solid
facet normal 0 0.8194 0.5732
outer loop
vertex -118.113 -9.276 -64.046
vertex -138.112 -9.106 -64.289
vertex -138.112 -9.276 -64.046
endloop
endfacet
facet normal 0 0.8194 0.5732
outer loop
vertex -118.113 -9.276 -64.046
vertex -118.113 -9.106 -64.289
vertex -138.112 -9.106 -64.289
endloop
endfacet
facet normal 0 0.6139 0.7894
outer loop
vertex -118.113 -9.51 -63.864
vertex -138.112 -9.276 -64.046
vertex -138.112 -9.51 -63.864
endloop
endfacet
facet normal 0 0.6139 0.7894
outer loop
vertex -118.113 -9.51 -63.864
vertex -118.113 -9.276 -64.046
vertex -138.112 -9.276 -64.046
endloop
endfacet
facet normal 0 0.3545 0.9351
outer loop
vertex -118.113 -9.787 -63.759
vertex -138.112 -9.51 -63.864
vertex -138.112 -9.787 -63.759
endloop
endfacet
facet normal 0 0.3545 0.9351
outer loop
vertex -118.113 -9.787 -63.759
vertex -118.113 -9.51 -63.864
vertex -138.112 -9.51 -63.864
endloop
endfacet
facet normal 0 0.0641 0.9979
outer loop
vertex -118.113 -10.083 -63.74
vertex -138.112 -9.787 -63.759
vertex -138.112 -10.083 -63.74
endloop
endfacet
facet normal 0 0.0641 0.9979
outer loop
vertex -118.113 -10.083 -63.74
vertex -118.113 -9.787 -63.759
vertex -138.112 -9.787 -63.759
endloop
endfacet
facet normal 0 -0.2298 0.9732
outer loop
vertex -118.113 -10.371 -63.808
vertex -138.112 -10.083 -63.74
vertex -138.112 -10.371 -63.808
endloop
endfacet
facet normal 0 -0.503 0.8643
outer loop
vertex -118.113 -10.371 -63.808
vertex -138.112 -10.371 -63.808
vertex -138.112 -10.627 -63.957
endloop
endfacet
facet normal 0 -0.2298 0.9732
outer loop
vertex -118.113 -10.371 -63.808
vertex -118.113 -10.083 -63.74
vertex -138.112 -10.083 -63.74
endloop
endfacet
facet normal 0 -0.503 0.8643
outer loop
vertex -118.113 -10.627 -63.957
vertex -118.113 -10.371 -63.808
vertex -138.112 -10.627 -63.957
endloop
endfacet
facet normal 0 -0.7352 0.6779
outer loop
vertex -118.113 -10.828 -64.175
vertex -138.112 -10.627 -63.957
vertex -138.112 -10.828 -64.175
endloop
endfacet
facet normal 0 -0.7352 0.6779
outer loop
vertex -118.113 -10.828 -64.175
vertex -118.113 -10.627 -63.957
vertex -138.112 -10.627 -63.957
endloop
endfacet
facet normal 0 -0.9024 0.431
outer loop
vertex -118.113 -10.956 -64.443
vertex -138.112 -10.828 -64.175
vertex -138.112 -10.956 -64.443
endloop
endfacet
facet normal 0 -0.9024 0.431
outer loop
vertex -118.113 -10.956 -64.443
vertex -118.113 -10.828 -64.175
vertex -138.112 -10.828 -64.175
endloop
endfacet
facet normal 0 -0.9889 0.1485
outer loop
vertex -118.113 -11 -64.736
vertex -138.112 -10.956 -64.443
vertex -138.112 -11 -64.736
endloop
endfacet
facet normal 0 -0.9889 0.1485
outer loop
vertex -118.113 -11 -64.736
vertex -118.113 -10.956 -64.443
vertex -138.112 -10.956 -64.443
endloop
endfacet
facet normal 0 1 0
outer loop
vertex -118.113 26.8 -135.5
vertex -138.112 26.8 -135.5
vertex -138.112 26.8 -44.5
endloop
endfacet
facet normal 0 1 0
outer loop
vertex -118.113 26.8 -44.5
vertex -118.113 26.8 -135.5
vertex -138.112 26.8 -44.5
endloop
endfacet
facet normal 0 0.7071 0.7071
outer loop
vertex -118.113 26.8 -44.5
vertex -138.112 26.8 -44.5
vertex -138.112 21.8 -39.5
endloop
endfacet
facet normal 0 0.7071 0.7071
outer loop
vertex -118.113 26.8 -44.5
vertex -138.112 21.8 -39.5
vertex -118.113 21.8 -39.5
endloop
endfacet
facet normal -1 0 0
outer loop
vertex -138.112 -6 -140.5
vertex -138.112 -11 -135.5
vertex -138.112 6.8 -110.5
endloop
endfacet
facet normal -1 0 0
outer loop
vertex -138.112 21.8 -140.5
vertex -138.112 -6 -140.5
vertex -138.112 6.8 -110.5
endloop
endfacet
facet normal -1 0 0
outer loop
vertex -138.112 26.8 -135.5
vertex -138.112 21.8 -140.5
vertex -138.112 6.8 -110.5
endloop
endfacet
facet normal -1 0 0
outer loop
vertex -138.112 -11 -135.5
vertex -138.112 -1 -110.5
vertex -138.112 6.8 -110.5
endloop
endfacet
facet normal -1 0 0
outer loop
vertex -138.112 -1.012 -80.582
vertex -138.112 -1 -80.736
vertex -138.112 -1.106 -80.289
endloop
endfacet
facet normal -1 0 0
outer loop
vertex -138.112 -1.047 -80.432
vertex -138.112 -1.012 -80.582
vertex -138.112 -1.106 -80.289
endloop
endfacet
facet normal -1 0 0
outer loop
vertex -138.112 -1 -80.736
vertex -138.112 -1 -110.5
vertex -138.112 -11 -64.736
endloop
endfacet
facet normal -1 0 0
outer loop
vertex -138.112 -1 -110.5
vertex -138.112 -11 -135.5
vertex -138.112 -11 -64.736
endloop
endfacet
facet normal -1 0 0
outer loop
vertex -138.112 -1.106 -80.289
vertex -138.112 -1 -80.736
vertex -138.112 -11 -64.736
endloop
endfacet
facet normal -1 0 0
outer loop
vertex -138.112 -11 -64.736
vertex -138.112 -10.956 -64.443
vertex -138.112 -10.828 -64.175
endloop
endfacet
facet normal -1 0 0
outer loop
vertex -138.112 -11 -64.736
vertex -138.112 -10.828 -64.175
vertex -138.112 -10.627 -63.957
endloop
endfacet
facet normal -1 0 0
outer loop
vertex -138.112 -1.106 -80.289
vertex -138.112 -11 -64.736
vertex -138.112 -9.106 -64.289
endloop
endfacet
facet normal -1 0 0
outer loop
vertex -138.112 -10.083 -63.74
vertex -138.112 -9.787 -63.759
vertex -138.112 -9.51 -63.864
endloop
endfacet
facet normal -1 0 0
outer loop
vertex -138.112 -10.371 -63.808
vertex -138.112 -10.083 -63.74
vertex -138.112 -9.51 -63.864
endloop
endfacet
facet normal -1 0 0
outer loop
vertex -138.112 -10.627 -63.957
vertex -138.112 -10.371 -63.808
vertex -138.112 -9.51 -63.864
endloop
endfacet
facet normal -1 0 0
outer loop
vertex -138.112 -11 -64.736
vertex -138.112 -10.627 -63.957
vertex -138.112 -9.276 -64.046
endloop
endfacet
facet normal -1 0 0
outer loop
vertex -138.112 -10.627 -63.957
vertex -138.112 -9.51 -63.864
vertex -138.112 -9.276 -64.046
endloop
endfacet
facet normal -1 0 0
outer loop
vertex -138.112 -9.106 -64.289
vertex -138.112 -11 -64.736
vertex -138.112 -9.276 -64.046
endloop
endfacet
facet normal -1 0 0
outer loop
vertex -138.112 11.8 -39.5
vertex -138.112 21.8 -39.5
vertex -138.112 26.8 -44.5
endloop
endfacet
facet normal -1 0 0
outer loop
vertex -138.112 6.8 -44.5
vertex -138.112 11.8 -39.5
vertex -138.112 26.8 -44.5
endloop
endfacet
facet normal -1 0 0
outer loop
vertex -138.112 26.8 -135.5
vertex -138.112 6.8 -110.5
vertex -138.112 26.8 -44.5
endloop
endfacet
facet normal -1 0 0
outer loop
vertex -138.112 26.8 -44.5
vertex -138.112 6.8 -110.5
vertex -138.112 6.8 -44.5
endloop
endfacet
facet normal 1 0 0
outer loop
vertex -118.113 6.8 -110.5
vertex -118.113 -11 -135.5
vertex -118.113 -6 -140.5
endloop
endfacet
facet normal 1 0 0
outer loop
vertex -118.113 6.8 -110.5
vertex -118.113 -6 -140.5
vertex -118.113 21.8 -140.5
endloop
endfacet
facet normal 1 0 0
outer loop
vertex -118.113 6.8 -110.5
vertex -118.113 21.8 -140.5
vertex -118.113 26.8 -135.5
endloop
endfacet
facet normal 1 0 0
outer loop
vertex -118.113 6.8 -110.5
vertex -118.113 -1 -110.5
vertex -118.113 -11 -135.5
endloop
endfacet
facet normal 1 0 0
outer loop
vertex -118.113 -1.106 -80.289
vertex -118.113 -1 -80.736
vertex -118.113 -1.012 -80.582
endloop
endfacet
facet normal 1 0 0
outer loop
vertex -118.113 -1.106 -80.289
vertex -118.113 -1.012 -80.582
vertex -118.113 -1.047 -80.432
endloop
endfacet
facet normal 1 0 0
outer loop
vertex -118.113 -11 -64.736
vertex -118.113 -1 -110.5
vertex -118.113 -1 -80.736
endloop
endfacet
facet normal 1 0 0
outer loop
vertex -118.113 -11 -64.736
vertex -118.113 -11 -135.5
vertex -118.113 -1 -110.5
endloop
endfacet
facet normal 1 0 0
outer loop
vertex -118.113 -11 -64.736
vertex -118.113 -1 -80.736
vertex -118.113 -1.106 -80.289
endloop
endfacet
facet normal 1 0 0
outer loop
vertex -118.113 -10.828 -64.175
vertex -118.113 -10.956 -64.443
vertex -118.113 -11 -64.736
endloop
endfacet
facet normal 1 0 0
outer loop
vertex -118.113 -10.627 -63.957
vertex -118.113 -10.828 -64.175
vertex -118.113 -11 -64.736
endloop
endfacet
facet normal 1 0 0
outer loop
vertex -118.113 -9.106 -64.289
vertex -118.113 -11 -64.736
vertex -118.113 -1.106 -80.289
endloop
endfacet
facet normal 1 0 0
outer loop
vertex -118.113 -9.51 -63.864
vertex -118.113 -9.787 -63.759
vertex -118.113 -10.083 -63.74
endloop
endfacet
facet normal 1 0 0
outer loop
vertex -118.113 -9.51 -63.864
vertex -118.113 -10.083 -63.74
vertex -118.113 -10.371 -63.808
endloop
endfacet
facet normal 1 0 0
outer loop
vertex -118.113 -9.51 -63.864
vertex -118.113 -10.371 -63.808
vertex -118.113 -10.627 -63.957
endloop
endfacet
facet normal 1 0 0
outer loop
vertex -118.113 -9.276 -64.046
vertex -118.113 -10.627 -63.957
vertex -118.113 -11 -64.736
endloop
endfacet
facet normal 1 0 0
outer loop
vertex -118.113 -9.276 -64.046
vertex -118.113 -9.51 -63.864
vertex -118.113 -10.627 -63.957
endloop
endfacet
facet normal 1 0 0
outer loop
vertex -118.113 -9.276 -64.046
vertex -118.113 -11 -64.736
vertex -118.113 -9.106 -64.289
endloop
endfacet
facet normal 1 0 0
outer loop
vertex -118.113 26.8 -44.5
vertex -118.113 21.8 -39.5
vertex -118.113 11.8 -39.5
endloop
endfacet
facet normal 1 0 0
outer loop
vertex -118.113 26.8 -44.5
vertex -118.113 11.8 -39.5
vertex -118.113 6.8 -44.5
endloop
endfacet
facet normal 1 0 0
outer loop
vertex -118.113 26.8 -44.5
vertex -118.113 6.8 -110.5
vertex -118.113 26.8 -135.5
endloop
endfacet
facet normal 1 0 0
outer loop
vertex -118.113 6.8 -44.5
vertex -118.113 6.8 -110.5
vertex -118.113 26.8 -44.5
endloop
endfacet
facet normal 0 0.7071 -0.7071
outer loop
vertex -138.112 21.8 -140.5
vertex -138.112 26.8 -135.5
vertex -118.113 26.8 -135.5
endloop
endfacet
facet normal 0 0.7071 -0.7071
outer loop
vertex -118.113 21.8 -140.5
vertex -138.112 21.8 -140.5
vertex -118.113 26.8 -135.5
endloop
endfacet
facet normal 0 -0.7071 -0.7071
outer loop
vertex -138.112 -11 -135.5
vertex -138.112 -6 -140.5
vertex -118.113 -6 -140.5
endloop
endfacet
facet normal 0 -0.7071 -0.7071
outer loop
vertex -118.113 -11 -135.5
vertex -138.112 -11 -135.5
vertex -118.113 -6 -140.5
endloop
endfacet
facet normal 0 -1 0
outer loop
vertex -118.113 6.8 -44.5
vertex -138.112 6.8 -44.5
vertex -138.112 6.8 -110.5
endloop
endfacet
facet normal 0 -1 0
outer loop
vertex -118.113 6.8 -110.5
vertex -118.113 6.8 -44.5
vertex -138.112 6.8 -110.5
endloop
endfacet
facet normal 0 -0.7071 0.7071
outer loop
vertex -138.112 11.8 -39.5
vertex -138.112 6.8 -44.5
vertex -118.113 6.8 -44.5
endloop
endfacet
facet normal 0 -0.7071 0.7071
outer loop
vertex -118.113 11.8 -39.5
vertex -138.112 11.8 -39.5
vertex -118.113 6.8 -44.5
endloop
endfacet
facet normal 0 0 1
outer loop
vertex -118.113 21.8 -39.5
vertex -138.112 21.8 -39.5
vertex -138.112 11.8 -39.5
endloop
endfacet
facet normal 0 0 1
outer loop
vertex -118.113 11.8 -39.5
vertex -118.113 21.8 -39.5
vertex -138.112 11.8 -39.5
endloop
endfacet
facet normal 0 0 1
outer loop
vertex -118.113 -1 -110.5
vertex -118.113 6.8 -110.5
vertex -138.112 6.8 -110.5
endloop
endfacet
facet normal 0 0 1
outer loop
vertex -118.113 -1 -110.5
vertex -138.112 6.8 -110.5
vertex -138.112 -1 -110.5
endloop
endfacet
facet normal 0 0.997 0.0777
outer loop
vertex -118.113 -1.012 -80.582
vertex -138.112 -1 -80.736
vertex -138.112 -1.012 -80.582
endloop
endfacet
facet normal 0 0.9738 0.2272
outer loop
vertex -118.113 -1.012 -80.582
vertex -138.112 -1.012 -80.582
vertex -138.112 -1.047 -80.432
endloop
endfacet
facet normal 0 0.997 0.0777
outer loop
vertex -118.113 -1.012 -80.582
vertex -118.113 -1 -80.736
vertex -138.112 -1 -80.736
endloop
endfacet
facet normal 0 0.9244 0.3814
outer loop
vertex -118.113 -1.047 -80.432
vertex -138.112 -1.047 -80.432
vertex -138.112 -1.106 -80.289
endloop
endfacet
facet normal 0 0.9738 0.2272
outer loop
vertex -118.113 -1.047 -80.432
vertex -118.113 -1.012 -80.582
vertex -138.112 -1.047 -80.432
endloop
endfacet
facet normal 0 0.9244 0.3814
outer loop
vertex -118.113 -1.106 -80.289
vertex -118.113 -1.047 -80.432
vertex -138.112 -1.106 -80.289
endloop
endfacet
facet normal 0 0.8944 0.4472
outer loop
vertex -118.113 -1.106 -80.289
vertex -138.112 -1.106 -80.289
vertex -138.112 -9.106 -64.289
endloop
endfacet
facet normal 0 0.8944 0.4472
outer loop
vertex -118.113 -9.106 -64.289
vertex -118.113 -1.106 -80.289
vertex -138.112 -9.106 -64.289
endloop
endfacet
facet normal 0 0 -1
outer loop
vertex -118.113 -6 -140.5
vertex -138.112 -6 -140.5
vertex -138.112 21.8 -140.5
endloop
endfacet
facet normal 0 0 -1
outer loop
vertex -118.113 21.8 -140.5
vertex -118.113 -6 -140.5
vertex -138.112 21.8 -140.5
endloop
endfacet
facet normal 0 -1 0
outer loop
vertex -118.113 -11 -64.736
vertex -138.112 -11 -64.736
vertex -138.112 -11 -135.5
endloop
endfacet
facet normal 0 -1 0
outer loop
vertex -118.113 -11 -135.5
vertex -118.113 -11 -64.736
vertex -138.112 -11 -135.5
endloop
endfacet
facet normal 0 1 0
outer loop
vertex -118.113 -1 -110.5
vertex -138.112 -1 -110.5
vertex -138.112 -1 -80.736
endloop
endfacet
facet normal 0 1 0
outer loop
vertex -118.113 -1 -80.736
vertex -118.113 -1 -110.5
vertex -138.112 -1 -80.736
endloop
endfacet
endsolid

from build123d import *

# Parameters (mm, degrees)
F3_DEPTH = 20
F4_SIZE  = 5
F5_R     = 1


with BuildPart() as f3:
    # F2 (on face) → F3 (new body)
    with BuildSketch(Plane.YZ.offset(-138.1125)):
        Polygon((26.8, -39.5), (6.8, -39.5), (6.8, -110.5), (-1, -110.5), (-1, -80.5), (-11, -60.5), (-11, -140.5), (26.8, -140.5), (26.8, -120.5), (26.8, -59.5), align=None)
    extrude(amount=F3_DEPTH)

    # F4
    f4_edges = [f3.edges().sort_by_distance(p)[0] for p in [
        (-128.1125, 26.8, -39.5),
        (-128.1125, 6.8, -39.5),
        (-128.1125, -11, -140.5),
        (-128.1125, 26.8, -140.5),
    ]]
    chamfer(f4_edges, length=F4_SIZE)

    # F5
    f5_edges = [f3.edges().sort_by_distance(p)[0] for p in [
        (-128.1125, -11, -60.5),
        (-128.1125, -1, -80.5),
    ]]
    fillet(f5_edges, radius=F5_R)


solid = f3.part
